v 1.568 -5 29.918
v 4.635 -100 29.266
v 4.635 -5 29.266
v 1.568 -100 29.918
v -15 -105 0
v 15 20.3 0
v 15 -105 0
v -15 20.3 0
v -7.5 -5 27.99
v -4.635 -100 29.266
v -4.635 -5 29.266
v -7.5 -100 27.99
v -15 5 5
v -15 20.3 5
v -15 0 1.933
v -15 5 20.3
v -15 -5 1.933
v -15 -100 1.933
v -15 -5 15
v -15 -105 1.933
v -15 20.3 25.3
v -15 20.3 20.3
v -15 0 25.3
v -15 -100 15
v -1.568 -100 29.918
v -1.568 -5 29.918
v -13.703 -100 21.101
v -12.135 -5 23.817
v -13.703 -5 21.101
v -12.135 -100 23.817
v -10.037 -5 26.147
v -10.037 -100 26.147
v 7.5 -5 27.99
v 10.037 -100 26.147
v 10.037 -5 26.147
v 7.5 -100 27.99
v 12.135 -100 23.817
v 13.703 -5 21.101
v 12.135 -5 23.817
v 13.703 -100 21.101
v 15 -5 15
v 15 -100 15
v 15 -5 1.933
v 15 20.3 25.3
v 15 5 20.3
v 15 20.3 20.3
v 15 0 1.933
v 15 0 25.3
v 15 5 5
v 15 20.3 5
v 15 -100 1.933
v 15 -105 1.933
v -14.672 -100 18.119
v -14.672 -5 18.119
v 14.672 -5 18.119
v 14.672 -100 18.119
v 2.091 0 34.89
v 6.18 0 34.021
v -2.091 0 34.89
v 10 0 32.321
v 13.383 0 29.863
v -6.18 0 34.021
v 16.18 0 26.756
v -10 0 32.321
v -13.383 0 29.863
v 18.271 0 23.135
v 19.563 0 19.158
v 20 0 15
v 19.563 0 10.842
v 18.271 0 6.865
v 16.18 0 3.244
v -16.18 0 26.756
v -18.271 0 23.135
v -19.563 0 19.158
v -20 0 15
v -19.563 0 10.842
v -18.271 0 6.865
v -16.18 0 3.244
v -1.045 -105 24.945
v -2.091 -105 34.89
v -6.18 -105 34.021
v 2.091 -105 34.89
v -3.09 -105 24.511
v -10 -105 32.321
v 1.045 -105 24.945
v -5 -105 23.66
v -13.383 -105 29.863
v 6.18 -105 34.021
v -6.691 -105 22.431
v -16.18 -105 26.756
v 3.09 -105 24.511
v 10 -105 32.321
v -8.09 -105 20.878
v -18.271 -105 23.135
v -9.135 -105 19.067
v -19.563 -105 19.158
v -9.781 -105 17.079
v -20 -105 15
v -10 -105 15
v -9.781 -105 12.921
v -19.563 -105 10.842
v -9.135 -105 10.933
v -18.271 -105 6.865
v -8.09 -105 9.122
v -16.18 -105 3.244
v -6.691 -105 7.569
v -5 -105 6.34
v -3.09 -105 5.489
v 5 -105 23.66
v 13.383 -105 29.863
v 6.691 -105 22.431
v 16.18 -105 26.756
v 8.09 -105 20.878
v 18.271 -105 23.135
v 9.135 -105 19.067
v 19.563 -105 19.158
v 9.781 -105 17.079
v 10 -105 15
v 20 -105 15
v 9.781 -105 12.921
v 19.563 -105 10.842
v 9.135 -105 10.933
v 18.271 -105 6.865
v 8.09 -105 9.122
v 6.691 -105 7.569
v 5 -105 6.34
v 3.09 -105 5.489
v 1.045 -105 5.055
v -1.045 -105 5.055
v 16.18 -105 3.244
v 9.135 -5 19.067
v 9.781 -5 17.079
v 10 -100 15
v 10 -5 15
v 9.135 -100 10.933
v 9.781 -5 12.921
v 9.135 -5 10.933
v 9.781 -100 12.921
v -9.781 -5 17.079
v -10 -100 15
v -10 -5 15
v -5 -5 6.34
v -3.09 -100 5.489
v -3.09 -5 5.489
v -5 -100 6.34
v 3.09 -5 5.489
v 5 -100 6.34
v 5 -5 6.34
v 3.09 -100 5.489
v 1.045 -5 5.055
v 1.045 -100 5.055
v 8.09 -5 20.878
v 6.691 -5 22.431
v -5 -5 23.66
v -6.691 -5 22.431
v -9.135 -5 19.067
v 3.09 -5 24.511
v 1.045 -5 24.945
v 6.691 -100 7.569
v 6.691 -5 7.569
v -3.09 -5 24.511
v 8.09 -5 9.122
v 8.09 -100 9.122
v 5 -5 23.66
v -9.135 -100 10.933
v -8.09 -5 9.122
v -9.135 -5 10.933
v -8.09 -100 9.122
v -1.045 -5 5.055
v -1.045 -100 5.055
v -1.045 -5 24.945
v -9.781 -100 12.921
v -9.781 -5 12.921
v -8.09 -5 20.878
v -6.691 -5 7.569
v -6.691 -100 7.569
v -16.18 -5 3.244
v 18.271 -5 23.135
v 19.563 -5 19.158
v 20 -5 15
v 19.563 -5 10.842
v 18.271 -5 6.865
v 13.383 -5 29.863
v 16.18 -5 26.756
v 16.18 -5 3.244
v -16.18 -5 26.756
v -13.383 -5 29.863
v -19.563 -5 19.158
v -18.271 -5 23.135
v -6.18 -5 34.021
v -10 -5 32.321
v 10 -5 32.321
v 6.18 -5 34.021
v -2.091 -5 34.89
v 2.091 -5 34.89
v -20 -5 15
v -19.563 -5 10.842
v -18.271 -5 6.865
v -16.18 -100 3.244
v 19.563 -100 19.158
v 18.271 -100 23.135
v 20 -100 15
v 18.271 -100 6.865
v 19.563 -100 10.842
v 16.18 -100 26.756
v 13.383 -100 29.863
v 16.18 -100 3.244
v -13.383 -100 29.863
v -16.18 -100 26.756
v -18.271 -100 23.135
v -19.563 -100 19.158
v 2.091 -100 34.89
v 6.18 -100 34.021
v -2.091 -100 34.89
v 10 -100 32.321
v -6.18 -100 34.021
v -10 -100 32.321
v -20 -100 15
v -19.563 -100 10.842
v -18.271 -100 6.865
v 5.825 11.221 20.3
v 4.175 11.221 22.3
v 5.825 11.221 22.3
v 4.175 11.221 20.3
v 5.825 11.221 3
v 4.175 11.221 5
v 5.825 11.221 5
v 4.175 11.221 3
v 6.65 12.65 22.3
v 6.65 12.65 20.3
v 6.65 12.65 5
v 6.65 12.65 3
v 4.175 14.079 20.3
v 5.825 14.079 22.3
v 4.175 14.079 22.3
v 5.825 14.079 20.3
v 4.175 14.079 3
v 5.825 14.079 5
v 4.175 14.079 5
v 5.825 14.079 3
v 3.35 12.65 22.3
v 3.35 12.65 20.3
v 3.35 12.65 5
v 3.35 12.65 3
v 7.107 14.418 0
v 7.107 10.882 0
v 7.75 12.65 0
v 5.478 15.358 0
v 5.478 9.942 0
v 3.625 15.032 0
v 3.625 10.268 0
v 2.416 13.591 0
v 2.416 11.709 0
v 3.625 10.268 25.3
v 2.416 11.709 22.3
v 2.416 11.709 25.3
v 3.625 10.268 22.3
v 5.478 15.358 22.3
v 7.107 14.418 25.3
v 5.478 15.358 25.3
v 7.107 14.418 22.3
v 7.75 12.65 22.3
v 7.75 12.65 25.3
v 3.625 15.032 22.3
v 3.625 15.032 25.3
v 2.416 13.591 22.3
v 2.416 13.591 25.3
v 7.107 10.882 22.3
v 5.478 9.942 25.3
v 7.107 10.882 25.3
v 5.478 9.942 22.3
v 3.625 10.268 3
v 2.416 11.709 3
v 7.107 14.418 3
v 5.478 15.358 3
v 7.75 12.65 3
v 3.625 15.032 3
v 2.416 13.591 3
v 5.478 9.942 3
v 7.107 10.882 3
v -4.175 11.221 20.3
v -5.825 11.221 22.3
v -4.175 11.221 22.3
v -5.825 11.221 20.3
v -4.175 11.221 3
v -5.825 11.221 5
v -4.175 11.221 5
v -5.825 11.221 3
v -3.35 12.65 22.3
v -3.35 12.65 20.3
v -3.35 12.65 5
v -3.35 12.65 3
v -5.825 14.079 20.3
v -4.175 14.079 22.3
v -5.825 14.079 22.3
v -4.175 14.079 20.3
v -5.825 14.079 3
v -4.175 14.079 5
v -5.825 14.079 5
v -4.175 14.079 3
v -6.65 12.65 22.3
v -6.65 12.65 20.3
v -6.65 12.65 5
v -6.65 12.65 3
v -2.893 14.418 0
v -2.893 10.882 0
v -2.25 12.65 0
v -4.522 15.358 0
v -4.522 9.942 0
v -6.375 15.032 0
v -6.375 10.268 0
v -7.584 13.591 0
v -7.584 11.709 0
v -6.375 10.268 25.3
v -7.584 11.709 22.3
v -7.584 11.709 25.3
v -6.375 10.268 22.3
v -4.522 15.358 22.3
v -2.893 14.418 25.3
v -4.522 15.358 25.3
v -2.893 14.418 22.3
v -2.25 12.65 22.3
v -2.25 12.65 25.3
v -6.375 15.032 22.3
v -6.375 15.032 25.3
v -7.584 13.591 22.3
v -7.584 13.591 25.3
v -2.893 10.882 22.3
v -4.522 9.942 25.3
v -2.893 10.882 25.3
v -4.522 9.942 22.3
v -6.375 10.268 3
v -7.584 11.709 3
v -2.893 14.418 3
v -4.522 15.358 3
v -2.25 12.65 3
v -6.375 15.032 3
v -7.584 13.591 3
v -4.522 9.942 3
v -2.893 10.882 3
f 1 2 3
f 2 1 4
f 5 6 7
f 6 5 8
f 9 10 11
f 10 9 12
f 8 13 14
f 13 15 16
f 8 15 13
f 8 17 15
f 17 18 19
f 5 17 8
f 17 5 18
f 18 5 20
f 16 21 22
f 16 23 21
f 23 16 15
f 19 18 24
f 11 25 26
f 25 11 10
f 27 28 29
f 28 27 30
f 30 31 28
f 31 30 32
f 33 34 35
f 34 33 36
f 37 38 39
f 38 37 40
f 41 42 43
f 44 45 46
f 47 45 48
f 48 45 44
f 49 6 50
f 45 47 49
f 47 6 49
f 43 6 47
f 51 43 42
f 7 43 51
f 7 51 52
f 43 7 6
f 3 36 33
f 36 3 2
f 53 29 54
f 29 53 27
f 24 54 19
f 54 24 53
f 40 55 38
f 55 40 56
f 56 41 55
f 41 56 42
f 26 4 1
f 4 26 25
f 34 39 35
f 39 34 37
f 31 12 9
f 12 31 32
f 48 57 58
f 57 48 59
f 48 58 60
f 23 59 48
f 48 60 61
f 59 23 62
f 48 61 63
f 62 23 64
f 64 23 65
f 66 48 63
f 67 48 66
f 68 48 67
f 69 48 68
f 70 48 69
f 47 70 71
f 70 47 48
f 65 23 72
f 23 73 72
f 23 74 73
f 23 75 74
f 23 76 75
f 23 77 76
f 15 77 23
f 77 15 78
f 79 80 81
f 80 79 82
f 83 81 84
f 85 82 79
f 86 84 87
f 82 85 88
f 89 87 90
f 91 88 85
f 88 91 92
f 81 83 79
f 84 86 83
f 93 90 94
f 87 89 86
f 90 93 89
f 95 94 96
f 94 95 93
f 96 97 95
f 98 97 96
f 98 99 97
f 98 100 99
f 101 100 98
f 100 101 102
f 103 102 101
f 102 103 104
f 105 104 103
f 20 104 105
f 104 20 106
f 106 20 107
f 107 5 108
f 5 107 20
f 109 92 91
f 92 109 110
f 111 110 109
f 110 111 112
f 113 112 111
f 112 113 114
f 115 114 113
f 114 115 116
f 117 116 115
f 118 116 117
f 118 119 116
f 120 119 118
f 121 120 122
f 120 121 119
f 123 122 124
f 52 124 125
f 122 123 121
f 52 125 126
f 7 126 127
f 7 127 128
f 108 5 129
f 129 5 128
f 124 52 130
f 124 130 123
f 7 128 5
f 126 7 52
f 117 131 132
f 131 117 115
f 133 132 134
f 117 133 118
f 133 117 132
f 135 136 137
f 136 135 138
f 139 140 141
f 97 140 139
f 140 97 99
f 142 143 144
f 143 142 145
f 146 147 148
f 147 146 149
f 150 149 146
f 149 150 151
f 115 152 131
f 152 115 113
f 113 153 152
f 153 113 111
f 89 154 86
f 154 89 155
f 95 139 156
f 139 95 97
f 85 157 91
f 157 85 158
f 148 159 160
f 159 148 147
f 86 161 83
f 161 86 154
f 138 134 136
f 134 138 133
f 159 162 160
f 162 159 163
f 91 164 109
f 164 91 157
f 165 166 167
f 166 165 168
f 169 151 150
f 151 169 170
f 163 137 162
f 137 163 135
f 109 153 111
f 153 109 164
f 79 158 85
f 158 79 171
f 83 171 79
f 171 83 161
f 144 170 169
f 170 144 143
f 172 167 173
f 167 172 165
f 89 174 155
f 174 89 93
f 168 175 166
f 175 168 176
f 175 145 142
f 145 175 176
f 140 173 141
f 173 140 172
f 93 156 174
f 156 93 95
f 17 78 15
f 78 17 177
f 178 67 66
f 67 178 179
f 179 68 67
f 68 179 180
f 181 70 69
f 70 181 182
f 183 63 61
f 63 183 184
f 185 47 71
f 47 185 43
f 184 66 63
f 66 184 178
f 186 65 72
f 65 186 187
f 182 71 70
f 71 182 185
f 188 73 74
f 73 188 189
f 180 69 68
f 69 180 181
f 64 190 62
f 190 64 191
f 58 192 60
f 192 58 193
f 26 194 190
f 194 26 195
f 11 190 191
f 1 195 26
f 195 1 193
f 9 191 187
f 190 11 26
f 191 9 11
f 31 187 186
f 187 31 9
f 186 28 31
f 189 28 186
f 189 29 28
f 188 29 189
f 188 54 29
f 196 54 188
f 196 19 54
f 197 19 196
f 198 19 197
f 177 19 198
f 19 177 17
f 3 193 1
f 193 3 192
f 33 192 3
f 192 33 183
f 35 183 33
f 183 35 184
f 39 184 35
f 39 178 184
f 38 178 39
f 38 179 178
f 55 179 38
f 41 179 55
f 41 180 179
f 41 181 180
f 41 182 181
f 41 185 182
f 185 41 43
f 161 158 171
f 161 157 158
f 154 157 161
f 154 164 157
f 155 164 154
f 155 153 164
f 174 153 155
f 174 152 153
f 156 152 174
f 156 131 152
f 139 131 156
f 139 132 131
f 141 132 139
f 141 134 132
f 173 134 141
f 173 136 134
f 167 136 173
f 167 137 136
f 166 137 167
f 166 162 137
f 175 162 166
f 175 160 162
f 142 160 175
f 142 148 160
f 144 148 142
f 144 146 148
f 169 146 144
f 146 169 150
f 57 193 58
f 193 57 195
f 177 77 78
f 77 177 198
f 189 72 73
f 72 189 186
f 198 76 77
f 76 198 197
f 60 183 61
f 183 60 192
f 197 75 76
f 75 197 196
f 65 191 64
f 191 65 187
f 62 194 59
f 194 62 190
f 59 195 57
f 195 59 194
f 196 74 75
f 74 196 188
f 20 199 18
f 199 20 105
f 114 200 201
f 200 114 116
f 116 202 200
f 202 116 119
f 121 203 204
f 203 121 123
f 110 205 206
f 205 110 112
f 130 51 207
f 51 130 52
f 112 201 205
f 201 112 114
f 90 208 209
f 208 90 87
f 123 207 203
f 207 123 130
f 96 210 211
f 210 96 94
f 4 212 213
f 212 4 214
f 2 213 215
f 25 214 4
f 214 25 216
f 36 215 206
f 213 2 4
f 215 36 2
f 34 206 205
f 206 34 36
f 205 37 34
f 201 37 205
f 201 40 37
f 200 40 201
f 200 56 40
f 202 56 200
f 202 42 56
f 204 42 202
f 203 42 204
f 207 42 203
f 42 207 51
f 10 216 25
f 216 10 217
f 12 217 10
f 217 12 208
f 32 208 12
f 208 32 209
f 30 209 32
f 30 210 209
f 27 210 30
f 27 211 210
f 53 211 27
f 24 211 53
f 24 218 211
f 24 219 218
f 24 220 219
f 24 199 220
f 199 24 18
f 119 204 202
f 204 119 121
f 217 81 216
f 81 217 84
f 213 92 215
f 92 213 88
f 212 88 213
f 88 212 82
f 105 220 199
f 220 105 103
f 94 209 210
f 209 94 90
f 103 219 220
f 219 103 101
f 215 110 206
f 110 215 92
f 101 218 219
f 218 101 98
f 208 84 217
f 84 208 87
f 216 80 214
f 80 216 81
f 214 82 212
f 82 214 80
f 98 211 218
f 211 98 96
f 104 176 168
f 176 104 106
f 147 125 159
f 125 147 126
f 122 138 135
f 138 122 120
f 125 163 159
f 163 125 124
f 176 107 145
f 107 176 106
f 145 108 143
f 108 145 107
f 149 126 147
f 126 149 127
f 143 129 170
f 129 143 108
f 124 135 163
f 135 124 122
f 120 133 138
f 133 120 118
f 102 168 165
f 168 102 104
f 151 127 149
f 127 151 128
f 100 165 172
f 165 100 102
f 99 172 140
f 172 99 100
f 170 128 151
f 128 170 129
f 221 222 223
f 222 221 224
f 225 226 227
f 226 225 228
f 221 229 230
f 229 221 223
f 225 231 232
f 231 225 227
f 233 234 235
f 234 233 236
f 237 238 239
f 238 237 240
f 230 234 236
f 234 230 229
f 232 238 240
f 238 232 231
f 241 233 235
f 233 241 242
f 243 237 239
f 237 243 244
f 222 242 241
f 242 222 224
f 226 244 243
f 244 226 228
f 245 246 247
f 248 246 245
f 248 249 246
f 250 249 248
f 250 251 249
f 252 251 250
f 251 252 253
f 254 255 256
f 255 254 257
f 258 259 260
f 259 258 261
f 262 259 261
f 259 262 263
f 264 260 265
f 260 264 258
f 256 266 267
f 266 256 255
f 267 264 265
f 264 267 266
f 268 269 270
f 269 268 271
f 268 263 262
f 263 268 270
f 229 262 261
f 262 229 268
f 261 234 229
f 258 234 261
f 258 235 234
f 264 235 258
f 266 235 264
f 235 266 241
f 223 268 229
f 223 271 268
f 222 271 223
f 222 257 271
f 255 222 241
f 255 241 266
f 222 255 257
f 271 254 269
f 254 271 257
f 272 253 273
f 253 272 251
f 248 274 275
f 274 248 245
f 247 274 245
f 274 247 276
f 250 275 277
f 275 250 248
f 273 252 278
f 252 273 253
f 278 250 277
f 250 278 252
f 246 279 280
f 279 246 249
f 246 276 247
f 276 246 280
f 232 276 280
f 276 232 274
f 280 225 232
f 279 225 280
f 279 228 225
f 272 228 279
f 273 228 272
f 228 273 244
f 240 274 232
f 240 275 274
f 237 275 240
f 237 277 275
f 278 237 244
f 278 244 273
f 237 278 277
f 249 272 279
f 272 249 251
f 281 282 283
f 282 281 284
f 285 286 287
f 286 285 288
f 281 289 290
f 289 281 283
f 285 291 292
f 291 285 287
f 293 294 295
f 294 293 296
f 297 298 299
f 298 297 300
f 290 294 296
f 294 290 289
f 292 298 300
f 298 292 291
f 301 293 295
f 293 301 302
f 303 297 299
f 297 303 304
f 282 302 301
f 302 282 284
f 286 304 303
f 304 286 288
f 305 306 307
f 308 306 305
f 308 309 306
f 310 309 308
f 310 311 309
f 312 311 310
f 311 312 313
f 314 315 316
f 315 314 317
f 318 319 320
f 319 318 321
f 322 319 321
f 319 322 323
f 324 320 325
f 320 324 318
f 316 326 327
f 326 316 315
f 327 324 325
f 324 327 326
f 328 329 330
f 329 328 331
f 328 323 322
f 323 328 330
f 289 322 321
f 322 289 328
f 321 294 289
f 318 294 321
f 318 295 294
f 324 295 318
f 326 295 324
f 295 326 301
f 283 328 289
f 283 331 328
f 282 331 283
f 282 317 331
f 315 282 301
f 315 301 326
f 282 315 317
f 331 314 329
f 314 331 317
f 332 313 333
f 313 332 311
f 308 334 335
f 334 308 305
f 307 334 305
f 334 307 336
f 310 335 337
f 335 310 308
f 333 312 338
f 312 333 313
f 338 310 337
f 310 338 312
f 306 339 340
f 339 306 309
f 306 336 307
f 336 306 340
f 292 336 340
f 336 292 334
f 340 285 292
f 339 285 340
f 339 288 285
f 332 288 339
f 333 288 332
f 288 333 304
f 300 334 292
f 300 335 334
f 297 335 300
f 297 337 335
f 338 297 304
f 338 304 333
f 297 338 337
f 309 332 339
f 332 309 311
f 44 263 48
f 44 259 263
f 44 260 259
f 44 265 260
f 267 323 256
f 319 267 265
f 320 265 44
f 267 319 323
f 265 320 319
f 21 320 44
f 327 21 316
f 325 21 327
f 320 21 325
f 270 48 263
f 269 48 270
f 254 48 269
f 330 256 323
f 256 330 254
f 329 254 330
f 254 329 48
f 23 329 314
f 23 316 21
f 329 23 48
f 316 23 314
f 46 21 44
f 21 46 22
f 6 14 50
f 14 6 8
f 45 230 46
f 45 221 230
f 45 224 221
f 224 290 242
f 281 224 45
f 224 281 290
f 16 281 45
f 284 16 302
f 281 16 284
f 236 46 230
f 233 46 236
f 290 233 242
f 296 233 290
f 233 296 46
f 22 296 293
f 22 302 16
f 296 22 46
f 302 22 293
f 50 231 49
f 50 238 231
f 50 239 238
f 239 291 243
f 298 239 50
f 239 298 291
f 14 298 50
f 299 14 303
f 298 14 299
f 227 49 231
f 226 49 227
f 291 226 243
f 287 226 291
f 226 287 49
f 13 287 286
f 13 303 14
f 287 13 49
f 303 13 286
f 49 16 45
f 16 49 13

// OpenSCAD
SpoolW = 95;
OB = 15.3;
width = 30;
wall= 5;
boltW=3.3;

module boltHoles(){
    h=3;
    cylinder(r=boltW/2, h = OB+2*wall, center=true);
    translate([0,0,(OB+2*wall-h)/2]) cylinder(r=5.5/2, h = h, center=true);
    translate([0,0,-(OB+2*wall-h)/2]) cylinder(r=5.5/2, h = h, center=true);
}
union(){
difference(){
hull(){
    translate([0,0,width/2]) rotate([90,0,0]) cylinder(r=width/2,h=SpoolW+2*wall);
    translate([-width/2,-SpoolW-wall*2,0]) cube([width, SpoolW+2*wall, wall]);
}
    translate([0,0,width/2]) rotate([90,0,0]) cylinder(r=width/2-wall,h=SpoolW+2*wall);
}
translate([0,0,width/2])
difference(){
     rotate([90,0,0]) cylinder(r=width/2+wall,h=wall);
     translate([-width/2,-wall-1,-width/2-wall]) cube([width,wall+2,wall]);
}
translate([0,-SpoolW-wall,width/2])
difference(){ 
     rotate([90,0,0]) cylinder(r=width/2+wall,h=wall);
     rotate([90,0,0]) cylinder(r=width/2-wall,h=wall+1);
     translate([-width/2,-wall-1,-width/2-wall]) cube([width,wall+2,wall]);
}
difference(){
    translate([-width/2,0,0]) cube([width, OB+wall, OB+2*wall]);
    translate([-width/2,wall,wall]) cube([width, OB, OB]);
    translate([width/6,wall+OB/2,(OB+2*wall)/2]) 
        boltHoles();
    translate([-width/6,wall+OB/2,(OB+2*wall)/2]) 
        boltHoles();
}
}
